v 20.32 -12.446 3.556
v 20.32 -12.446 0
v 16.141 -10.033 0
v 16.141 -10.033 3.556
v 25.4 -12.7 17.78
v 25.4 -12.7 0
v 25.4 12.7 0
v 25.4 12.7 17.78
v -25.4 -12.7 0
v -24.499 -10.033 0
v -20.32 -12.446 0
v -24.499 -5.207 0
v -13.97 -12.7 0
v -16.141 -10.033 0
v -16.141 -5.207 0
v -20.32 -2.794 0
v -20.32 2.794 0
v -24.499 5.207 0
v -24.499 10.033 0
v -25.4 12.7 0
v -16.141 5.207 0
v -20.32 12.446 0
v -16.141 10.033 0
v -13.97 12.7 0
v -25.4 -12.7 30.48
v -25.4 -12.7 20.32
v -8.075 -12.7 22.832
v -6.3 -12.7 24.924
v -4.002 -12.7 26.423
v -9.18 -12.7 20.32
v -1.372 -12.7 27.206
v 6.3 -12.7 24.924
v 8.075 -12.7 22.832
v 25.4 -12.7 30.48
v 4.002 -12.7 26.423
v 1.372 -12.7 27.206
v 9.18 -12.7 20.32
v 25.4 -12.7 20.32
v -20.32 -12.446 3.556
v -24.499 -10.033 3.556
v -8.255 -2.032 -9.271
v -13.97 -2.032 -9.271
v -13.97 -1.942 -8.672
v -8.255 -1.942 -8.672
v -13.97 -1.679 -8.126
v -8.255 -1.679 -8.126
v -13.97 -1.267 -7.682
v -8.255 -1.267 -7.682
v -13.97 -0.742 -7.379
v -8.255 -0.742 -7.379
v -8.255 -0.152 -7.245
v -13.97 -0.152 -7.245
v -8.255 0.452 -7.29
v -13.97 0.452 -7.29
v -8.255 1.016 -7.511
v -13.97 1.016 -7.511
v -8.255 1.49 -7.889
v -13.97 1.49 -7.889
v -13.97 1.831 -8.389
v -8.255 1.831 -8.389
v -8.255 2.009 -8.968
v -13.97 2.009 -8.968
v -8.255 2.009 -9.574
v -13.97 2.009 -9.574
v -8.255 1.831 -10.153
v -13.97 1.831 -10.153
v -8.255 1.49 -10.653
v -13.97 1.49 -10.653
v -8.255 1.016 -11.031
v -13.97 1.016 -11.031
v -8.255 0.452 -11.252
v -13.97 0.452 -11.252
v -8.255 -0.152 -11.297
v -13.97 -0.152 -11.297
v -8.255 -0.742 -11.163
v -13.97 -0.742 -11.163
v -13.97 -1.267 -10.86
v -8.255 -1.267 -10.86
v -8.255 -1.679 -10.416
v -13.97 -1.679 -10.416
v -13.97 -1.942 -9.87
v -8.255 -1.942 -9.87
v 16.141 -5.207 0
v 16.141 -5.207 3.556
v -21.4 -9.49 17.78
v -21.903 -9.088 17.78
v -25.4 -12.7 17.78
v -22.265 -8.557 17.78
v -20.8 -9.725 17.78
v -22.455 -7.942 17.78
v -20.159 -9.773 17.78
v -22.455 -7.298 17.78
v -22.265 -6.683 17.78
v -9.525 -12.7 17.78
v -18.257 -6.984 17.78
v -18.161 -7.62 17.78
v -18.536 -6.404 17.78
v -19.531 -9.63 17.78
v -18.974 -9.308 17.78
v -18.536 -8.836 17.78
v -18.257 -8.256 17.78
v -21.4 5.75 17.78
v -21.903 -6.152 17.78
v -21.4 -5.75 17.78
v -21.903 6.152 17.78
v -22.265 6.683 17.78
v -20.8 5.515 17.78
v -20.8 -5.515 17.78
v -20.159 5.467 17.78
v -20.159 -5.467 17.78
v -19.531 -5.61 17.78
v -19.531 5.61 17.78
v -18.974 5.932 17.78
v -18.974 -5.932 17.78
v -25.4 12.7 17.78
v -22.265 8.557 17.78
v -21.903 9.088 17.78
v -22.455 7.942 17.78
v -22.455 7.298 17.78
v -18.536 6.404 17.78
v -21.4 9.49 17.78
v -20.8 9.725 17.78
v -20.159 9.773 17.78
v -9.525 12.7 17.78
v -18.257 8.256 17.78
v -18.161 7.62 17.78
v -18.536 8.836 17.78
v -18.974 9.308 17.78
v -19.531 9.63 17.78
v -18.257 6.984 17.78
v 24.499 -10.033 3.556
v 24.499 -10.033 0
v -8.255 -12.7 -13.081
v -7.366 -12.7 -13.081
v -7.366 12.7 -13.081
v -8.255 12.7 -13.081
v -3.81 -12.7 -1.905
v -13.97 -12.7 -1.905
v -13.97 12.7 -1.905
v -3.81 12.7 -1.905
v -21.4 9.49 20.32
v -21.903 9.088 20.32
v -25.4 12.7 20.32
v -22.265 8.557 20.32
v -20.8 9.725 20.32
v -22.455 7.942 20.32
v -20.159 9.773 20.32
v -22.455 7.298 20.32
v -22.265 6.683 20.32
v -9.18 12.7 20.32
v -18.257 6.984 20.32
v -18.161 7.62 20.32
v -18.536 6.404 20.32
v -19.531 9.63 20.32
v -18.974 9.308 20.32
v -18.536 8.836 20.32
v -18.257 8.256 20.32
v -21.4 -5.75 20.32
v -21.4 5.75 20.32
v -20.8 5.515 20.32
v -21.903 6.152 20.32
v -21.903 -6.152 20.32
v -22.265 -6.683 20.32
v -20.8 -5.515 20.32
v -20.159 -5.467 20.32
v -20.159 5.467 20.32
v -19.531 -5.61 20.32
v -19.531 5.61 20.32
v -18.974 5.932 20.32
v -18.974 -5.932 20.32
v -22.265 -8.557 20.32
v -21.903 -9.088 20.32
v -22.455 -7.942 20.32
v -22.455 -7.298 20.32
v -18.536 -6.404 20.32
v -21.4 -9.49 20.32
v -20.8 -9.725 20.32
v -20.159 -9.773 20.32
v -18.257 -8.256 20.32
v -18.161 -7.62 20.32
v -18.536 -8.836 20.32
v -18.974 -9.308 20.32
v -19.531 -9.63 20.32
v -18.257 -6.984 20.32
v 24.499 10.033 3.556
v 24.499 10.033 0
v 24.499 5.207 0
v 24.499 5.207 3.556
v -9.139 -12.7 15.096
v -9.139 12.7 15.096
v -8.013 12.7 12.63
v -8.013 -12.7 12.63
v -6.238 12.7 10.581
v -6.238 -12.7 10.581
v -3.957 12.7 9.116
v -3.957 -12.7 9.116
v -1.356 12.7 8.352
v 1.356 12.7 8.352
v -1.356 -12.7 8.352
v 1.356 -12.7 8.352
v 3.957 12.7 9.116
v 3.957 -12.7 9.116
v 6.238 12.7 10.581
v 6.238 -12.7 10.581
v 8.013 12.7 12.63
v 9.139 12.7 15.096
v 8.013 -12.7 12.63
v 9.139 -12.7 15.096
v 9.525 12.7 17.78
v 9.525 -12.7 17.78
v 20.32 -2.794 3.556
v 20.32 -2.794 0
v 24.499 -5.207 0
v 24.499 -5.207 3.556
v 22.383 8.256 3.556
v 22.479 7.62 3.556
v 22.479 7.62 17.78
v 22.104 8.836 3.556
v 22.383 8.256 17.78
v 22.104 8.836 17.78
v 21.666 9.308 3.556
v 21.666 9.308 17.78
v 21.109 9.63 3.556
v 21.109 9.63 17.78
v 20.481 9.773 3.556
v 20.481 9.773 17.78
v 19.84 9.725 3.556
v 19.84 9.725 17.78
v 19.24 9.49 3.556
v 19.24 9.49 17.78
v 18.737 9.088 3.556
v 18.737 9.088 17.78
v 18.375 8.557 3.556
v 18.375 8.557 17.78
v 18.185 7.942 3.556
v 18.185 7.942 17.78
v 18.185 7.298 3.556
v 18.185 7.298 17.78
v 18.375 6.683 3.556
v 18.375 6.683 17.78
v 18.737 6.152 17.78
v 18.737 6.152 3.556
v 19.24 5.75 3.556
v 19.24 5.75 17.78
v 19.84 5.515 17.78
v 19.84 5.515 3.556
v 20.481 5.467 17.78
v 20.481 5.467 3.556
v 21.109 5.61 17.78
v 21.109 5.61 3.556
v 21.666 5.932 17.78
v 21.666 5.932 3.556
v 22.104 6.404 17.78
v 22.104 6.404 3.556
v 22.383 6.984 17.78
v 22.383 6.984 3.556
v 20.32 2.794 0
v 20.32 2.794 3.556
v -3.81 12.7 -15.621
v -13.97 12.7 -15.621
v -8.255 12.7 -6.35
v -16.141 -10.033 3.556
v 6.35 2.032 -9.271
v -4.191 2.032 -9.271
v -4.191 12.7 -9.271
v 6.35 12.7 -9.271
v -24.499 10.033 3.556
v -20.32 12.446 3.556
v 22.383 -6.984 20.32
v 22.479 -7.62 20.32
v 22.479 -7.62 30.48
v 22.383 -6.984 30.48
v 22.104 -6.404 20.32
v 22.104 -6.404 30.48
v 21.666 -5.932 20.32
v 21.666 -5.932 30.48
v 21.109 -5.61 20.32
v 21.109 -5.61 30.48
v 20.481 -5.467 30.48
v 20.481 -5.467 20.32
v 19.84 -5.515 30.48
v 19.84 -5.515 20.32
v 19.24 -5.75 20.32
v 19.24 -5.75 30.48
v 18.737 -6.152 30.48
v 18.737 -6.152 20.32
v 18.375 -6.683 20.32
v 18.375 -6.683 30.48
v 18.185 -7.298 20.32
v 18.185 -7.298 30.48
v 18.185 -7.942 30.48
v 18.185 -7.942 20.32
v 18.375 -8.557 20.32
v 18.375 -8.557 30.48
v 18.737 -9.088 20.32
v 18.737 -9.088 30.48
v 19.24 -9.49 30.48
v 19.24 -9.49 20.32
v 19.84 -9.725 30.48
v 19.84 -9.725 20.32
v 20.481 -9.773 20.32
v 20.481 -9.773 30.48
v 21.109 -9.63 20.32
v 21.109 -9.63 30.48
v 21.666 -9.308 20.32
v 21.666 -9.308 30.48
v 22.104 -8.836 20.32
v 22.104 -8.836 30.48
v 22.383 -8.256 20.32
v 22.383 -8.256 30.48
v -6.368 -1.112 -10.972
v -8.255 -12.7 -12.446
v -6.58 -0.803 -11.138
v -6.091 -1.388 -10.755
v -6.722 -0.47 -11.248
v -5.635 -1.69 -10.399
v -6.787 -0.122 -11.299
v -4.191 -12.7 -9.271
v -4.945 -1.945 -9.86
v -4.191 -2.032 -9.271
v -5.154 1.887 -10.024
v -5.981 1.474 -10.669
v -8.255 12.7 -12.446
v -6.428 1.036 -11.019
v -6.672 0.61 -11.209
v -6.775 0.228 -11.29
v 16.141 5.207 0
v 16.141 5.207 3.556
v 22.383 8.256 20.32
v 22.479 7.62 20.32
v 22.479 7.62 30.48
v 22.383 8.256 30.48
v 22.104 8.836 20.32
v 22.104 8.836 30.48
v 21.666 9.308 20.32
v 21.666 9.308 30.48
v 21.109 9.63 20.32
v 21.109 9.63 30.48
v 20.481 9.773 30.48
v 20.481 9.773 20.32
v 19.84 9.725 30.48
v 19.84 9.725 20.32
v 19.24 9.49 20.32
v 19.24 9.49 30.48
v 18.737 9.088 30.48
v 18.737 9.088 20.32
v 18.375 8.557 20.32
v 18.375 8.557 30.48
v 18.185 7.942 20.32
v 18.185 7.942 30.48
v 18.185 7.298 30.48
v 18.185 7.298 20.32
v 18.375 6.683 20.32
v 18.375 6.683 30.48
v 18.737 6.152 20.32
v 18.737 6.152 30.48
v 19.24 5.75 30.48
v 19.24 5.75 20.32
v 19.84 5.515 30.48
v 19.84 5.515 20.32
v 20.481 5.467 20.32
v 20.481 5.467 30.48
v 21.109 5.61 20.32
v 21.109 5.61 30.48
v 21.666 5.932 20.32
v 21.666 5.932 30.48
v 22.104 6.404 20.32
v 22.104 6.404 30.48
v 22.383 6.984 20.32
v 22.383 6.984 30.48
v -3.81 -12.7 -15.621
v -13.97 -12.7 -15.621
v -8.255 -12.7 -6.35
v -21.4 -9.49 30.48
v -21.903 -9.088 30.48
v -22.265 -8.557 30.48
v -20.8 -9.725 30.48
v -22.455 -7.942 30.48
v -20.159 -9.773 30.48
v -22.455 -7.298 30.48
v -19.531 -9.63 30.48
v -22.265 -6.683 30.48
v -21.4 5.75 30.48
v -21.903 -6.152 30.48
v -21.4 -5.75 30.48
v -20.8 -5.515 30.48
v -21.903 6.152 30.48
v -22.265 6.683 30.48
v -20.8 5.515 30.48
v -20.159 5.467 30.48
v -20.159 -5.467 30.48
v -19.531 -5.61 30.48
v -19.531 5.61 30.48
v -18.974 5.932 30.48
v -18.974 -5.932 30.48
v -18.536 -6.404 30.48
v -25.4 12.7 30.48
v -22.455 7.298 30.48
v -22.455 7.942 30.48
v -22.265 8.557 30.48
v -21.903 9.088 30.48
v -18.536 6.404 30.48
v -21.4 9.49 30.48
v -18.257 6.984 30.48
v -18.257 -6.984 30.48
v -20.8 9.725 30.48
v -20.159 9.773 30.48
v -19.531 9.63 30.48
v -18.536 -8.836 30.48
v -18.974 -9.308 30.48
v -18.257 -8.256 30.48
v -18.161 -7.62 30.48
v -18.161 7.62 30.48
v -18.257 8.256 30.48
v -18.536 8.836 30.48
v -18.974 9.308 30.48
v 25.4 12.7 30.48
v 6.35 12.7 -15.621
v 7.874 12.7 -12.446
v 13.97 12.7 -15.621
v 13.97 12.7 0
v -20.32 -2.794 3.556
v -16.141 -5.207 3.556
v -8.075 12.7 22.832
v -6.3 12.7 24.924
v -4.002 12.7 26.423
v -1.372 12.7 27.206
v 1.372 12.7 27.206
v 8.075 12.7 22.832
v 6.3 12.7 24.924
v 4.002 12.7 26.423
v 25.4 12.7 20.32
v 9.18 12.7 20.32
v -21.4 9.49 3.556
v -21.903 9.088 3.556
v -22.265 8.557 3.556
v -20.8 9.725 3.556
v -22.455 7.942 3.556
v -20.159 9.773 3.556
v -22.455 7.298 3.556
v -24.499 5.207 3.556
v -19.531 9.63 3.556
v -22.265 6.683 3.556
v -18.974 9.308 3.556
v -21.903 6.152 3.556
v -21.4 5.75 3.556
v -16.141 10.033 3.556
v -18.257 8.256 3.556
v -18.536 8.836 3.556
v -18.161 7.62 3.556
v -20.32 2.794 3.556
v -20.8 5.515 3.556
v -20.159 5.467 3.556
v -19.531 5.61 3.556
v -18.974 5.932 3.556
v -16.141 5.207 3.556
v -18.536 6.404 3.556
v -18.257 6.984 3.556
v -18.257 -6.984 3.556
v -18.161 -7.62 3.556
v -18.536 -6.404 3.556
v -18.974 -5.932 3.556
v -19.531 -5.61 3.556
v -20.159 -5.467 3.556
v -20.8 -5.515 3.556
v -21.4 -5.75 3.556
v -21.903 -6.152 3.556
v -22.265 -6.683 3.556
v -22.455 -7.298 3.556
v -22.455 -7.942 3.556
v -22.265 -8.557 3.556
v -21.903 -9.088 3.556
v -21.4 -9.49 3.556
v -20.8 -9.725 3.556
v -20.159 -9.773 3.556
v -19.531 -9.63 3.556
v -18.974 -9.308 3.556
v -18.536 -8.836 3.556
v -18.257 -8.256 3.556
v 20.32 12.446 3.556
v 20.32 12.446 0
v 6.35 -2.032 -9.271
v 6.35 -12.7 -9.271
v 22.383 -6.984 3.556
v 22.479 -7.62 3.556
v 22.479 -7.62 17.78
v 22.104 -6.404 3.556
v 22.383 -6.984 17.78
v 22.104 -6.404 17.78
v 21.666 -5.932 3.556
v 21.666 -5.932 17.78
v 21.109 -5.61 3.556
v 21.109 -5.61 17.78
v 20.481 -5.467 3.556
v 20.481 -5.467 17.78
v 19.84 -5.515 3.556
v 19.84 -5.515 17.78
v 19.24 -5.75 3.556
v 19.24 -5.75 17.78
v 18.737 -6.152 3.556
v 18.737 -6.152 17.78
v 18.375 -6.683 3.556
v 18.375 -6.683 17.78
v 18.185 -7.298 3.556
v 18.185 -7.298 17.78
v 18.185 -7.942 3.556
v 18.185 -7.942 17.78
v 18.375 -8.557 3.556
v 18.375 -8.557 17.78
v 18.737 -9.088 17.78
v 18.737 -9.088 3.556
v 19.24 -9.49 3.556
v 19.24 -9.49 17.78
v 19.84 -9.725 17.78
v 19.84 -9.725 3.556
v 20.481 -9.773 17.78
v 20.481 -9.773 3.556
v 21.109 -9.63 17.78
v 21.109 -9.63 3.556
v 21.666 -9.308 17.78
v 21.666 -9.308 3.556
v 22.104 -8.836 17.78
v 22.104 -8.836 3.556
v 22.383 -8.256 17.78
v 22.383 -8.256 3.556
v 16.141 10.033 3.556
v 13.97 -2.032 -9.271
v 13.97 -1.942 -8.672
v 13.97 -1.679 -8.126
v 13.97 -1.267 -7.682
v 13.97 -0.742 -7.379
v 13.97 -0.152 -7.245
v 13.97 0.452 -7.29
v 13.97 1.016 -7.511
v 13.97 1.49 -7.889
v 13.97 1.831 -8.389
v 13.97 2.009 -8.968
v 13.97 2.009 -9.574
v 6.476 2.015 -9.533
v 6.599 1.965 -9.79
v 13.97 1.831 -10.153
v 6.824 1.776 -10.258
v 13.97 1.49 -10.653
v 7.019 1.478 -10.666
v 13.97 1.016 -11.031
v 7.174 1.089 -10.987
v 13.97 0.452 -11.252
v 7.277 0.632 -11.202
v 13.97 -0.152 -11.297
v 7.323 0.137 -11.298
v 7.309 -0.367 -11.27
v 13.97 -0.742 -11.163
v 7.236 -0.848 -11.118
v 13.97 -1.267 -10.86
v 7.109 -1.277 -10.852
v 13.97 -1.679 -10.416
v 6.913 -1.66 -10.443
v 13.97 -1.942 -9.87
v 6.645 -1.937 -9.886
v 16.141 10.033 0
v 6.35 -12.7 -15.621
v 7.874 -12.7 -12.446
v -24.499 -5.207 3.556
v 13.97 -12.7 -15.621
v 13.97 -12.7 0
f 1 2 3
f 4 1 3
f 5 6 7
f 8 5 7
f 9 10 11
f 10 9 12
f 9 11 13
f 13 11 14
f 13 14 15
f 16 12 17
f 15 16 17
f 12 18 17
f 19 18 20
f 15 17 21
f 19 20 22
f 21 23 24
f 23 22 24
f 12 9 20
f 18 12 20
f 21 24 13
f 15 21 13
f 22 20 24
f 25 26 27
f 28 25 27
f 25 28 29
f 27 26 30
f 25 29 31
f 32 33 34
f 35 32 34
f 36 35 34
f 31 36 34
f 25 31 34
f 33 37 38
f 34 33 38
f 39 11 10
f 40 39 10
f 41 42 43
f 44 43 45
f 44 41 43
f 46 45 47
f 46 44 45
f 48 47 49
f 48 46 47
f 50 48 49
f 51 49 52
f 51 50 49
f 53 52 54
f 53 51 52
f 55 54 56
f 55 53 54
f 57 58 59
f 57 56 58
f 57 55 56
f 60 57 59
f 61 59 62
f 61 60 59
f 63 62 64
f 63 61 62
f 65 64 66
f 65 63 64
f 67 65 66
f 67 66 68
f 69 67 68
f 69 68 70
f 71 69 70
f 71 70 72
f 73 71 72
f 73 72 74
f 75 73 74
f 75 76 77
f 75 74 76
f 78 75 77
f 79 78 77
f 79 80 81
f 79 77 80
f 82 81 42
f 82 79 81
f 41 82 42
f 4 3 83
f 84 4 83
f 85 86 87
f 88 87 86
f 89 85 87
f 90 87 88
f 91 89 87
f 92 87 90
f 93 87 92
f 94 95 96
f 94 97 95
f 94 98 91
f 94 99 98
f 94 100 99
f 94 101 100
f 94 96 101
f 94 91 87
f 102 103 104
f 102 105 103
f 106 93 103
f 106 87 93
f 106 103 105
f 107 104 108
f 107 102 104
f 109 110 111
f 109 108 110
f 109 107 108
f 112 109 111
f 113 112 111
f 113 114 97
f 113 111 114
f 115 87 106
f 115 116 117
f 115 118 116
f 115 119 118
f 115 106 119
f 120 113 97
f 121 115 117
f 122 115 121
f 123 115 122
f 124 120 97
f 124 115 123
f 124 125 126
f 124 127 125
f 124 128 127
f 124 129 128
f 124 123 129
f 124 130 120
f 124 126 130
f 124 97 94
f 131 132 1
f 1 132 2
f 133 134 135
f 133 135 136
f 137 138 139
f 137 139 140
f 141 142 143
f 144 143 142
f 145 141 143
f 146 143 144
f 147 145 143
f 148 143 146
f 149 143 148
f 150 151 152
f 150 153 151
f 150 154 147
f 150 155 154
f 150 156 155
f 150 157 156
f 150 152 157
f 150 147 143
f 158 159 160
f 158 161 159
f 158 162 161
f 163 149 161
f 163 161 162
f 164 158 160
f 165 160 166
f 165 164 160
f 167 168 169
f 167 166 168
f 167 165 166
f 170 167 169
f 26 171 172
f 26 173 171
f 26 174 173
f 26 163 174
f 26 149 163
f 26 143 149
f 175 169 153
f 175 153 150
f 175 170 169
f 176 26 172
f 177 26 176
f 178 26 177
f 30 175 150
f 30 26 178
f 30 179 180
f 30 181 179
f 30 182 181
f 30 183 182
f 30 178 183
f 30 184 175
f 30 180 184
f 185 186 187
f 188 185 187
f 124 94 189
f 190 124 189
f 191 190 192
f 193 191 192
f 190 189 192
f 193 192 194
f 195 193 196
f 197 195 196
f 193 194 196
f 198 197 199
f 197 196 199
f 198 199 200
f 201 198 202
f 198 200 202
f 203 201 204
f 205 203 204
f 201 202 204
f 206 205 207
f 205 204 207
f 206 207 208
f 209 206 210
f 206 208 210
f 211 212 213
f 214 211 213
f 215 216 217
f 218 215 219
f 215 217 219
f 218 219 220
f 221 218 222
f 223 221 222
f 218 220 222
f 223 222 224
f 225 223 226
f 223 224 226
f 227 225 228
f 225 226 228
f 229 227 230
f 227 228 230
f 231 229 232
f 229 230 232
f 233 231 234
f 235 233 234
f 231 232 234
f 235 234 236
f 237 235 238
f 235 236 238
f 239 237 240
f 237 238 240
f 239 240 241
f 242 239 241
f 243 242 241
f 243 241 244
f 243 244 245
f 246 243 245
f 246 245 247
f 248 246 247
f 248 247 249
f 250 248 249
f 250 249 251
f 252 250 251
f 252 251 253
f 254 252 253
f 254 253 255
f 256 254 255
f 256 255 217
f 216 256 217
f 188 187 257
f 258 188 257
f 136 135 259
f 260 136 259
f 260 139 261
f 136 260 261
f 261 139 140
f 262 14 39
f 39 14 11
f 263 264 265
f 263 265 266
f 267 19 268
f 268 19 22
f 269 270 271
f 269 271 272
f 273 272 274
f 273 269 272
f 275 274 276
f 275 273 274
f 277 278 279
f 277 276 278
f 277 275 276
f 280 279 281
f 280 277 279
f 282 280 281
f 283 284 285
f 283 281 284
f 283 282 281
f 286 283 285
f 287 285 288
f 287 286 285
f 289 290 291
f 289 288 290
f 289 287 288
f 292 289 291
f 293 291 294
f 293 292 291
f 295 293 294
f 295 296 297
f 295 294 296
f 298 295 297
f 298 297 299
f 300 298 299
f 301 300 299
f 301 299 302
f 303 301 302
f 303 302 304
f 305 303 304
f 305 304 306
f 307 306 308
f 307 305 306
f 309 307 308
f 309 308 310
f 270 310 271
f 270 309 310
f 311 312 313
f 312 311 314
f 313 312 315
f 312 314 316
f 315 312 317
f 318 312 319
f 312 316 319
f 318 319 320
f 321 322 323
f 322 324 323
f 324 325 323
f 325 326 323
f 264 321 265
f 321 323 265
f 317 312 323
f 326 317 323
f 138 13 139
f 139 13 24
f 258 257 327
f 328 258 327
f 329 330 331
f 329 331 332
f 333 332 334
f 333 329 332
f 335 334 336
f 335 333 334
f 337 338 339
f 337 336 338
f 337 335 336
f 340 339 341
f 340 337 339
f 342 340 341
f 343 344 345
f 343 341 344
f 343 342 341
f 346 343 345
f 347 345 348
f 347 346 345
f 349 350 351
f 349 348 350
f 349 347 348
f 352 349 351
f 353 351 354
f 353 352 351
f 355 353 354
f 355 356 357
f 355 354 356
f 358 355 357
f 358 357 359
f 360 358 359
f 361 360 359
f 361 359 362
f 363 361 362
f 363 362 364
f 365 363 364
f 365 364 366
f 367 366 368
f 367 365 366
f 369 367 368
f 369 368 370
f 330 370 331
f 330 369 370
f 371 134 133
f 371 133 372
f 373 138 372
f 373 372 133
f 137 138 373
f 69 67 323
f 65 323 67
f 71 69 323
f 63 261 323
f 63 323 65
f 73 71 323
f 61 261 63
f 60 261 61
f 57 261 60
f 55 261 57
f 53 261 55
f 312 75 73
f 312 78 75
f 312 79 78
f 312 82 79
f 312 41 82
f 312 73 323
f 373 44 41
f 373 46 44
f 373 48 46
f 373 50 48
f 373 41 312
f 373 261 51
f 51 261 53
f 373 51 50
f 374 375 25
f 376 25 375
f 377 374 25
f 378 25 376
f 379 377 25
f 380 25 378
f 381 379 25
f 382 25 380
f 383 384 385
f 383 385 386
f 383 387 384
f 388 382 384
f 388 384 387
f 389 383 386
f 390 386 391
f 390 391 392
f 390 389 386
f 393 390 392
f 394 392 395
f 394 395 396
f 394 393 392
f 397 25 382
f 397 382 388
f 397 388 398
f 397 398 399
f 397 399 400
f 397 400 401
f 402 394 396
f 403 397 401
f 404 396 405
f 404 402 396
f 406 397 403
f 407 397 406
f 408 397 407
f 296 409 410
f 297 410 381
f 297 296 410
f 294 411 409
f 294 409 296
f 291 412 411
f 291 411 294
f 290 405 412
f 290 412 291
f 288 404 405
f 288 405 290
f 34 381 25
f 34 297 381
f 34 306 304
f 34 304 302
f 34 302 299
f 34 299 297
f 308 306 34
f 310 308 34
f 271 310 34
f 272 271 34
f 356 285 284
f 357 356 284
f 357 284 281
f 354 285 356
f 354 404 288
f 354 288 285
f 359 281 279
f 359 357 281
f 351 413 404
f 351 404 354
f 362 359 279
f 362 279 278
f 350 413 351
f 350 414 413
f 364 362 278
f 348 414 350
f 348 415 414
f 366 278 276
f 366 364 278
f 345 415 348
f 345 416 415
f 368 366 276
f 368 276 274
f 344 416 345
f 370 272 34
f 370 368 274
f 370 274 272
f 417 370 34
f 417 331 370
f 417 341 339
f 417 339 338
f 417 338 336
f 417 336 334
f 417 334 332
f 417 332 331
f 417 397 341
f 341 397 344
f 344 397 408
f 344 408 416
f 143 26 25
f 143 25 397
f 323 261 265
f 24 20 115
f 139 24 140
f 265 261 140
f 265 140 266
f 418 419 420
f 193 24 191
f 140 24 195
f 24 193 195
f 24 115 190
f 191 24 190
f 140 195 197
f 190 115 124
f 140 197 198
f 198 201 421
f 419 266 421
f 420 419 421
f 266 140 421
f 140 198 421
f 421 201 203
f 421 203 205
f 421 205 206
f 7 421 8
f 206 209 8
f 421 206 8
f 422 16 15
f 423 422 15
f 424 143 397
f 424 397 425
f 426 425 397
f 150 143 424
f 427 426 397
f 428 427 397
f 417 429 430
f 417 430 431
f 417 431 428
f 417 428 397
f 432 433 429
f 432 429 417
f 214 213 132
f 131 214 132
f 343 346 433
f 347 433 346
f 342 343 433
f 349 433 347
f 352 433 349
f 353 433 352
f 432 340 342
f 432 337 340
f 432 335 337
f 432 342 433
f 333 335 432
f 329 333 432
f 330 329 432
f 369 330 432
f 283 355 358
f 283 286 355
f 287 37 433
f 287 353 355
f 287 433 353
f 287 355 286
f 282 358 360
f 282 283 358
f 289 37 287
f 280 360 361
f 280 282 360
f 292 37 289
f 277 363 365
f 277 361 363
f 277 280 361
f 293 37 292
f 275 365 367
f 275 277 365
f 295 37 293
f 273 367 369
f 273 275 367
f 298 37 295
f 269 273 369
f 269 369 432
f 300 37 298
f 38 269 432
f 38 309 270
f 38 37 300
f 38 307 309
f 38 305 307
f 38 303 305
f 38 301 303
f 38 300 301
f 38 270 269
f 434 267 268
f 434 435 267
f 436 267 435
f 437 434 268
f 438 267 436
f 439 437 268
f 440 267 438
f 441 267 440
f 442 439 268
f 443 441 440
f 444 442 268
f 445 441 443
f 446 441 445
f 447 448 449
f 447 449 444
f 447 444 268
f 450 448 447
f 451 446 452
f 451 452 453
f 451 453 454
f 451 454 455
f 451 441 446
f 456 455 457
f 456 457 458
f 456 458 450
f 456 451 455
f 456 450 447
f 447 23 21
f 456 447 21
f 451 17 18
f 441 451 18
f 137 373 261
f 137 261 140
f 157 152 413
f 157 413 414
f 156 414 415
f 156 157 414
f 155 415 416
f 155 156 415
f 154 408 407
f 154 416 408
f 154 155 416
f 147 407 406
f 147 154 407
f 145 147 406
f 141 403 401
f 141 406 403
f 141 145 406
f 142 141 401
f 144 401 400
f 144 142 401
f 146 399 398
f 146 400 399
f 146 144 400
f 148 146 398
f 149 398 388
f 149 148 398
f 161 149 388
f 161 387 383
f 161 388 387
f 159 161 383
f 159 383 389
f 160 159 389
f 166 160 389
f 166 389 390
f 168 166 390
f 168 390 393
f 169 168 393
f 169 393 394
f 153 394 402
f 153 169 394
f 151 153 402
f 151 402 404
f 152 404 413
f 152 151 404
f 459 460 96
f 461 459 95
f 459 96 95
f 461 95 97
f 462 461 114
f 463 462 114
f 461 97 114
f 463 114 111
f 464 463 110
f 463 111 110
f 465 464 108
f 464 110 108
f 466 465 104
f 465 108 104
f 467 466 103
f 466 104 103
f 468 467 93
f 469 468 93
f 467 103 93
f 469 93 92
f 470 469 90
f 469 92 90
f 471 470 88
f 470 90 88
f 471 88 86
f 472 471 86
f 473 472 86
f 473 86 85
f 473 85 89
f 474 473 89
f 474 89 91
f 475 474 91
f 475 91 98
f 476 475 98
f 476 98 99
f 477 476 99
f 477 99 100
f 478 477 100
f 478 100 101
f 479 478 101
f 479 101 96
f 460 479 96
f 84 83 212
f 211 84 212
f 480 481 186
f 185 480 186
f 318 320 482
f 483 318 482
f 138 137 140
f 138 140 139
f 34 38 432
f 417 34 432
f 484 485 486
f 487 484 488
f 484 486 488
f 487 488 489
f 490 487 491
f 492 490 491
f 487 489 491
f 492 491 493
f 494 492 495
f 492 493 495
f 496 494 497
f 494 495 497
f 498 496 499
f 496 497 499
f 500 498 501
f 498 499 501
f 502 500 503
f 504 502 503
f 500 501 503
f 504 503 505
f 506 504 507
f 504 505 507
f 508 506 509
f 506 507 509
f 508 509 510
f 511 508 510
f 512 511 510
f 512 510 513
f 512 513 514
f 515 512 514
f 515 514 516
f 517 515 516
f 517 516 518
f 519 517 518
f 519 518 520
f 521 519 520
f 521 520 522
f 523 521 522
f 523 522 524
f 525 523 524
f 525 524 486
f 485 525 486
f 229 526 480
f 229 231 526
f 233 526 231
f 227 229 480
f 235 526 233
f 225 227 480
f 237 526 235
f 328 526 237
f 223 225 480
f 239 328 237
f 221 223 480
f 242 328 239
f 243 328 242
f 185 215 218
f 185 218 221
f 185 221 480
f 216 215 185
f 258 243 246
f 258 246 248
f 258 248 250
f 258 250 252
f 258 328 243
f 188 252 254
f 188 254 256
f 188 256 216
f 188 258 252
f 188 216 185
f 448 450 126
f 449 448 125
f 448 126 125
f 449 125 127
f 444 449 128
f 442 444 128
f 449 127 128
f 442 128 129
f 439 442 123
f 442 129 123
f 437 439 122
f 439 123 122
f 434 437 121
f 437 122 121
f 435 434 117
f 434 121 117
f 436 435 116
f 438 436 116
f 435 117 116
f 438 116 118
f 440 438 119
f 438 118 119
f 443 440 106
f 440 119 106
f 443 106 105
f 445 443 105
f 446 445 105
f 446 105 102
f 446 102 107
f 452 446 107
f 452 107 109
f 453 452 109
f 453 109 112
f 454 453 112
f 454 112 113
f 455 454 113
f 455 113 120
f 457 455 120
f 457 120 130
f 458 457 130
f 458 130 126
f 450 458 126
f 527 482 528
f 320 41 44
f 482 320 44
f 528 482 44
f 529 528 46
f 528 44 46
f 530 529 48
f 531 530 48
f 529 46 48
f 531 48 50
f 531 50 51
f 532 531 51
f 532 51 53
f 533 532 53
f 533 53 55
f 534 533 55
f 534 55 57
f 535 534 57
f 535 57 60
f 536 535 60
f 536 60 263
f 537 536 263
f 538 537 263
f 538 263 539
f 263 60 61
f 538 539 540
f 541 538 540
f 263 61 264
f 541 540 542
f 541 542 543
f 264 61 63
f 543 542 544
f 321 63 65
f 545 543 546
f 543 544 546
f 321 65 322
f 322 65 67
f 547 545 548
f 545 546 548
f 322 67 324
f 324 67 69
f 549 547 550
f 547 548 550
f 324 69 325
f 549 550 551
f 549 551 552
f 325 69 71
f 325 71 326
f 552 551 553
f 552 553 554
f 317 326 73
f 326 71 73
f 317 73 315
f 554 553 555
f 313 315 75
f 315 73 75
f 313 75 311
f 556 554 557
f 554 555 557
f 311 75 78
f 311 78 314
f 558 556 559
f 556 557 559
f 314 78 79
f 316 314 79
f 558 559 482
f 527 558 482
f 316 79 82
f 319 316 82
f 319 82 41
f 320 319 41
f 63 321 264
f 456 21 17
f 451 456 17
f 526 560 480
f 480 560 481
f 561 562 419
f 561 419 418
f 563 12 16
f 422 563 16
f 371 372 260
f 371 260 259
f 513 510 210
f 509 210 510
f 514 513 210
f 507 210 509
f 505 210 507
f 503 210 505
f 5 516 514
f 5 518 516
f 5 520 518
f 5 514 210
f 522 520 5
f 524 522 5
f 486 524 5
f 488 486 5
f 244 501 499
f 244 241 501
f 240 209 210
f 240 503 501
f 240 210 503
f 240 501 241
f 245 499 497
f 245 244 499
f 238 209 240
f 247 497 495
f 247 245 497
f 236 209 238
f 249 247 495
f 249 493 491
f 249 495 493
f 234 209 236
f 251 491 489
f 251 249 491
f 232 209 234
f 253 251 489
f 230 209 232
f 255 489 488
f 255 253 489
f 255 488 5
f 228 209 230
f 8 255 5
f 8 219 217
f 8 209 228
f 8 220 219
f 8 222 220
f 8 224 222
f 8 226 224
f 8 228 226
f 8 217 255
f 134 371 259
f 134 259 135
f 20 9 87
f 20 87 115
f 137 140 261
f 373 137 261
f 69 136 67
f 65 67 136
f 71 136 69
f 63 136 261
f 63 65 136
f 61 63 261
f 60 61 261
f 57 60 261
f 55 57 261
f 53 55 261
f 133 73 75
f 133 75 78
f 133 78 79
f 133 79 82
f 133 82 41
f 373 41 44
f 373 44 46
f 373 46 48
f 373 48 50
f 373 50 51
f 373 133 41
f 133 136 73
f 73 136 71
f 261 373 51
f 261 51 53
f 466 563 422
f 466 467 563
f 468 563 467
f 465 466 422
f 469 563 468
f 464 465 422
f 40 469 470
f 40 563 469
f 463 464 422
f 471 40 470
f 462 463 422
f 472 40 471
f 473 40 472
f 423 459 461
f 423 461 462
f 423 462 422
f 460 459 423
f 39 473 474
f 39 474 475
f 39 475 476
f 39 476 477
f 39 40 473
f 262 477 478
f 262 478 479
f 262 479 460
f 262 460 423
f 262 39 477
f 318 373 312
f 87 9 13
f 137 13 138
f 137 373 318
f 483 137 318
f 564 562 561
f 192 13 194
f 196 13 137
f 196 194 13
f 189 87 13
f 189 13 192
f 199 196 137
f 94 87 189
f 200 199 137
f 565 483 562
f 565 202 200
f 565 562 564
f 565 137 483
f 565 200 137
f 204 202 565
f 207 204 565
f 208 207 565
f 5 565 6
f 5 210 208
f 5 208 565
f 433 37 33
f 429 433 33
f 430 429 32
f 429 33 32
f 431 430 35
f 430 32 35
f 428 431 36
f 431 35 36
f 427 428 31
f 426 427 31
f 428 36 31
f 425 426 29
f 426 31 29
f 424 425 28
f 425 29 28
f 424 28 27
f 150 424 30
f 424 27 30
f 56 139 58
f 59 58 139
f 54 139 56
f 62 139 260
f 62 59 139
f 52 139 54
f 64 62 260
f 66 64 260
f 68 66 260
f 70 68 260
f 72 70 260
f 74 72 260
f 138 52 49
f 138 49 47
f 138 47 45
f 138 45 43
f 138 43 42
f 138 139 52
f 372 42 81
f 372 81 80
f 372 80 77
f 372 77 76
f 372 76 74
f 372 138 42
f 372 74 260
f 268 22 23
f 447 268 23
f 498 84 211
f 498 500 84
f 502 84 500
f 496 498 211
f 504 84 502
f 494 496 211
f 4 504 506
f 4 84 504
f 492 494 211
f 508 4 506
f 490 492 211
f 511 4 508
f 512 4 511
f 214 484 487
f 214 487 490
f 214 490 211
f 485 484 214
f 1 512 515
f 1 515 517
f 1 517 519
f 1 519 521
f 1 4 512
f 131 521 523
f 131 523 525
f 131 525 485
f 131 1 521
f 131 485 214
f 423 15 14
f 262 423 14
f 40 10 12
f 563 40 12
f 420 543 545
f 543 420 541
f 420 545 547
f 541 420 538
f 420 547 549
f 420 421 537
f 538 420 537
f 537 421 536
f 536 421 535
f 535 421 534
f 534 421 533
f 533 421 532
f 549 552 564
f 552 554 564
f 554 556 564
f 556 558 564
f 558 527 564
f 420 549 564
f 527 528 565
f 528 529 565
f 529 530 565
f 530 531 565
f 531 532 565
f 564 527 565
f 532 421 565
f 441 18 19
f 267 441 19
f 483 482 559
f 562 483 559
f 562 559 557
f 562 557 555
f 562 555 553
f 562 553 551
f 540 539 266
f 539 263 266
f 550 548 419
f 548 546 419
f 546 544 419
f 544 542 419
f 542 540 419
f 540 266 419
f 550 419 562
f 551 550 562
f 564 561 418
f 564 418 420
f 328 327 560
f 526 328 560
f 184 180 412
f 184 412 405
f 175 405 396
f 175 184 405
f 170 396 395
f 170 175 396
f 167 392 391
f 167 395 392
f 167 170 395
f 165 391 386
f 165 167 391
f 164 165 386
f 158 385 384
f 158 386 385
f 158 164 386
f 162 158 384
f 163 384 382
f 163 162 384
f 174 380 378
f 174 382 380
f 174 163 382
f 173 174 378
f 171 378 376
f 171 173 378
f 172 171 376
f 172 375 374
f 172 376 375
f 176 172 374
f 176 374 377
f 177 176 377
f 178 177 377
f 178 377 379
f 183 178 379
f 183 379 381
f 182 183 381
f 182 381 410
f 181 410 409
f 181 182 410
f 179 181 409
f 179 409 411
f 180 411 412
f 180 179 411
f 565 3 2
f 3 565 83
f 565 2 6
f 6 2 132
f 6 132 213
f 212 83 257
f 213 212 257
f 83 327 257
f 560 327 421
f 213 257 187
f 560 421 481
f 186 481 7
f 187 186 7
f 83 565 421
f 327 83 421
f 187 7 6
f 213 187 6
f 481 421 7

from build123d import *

# Parameters (mm, degrees)
F0_W           = 50.8
F0_H           = 25.4
F1_DEPTH       = 17.78
F3_W           = 50.8
F3_H           = 25.4
F4_DEPTH       = 12.7
F2_R           = 9.525
F5_DEPTH       = 76.2
F6_R           = 9.525
F7_DEPTH       = 76.2
F8_W           = 76.2
F8_H           = 58.4089004228
F9_DEPTH       = 2.54
F10_R          = 2.159
F11_DEPTH      = 17.781
F11_DEPTH_BACK = 25.4
F12_R          = 2.159
F13_DEPTH      = 25.4
F13_DEPTH_BACK = 25.4
F15_DEPTH      = 3.556
F16_W          = 27.94
F16_H          = 12.7
F17_DEPTH      = 1.905
F18_W          = 22.225
F18_H          = 25.4
F19_DEPTH      = 7.366
F22_DEPTH      = 50.8
F23_W          = 22.225
F23_H          = 25.4
F24_DEPTH      = 6.35
F26_DEPTH      = 50.8
F28_DEPTH      = 25.4
F20_R          = 2.032
F29_DEPTH      = 50.8
F29_DEPTH_BACK = 25.4


with BuildPart() as f1:
    # F0 (on Top) → F1 (new body)
    with BuildSketch(Plane.XY):
        Rectangle(F0_W, F0_H)
    extrude(amount=F1_DEPTH)


with BuildPart() as f4:
    # F3 (on face) → F4 (new body)
    with BuildSketch(Plane.XY.offset(17.78)):
        Rectangle(F3_W, F3_H)
    extrude(amount=F4_DEPTH)


with BuildPart() as f5_tool:
    # F2 (on face) → F5 (new body)
    with BuildSketch(Plane.XZ.offset(12.7)):
        with Locations((0, 17.78)):
            Circle(F2_R)
    extrude(amount=-F5_DEPTH)


with BuildPart() as f1_1:
    add(f1.part)

    # F5: cut by f5_tool
    add(f5_tool.part, mode=Mode.SUBTRACT)

    # F6 (on face) → F7 (cut)
    with BuildSketch(Plane.XZ.offset(12.7)):
        with Locations((0, 17.78)):
            Circle(F6_R)
    extrude(amount=-F7_DEPTH, mode=Mode.SUBTRACT)


with BuildPart() as f4_1:
    add(f4.part)

    # F5: cut by f5_tool
    add(f5_tool.part, mode=Mode.SUBTRACT)

    # F8 (on face) → F9 (cut)
    with BuildSketch(Plane(origin=(0, 0, 17.78), x_dir=(1, 0, 0), z_dir=(0, 0, -1))):
        with Locations((12.7, -16.5044502114)):
            Rectangle(F8_W, F8_H)
    extrude(amount=-F9_DEPTH, mode=Mode.SUBTRACT)


with BuildPart() as f11_tool:
    # F10 (on face) → F11 (new body, two sides)
    with BuildSketch(Plane.XY.offset(17.78)) as f11_sk:
        with Locations((-20.32, -7.62)):
            Circle(F10_R)
        with Locations((-20.32, 7.62)):
            Circle(F10_R)
    extrude(amount=-F11_DEPTH)
    extrude(f11_sk.sketch, amount=F11_DEPTH_BACK)


with BuildPart() as f1_2:
    add(f1_1.part)

    # F11: cut by f11_tool
    add(f11_tool.part, mode=Mode.SUBTRACT)


with BuildPart() as f4_2:
    add(f4_1.part)

    # F11: cut by f11_tool
    add(f11_tool.part, mode=Mode.SUBTRACT)


with BuildPart() as f13_tool:
    # F12 (on face) → F13 (new body, two sides)
    with BuildSketch(Plane.XY.offset(17.78)) as f13_sk:
        with Locations((20.32, -7.62)):
            Circle(F12_R)
        with Locations((20.32, 7.62)):
            Circle(F12_R)
    extrude(amount=-F13_DEPTH)
    extrude(f13_sk.sketch, amount=F13_DEPTH_BACK)


with BuildPart() as f1_3:
    add(f1_2.part)

    # F13: cut by f13_tool
    add(f13_tool.part, mode=Mode.SUBTRACT)

    # F14 (on face) → F15 (cut)
    with BuildSketch(Plane(origin=(0, 0, 0), x_dir=(1, 0, 0), z_dir=(0, 0, -1))):
        Polygon((-20.32, 2.794), (-16.1405614013, 5.207), (-16.1405614013, 10.033), (-20.32, 12.446), (-24.4994385987, 10.033), (-24.4994385987, 5.207), align=None)
        Polygon((-16.1405614013, -5.207), (-20.32, -2.794), (-24.4994385987, -5.207), (-24.4994385987, -10.033), (-20.32, -12.446), (-16.1405614013, -10.033), align=None)
        Polygon((16.1405614013, 5.207), (20.32, 2.794), (24.4994385987, 5.207), (24.4994385987, 10.033), (20.32, 12.446), (16.1405614013, 10.033), align=None)
        Polygon((24.4994385987, -10.033), (24.4994385987, -5.207), (20.32, -2.794), (16.1405614013, -5.207), (16.1405614013, -10.033), (20.32, -12.446), align=None)
    extrude(amount=-F15_DEPTH, mode=Mode.SUBTRACT)

    # F16 (on face) → F17 (join)
    with BuildSketch(Plane(origin=(0, 0, 0), x_dir=(1, 0, 0), z_dir=(0, 0, -1))):
        with Locations((0, 6.35)):
            Rectangle(F16_W, F16_H)
        with Locations((0, -6.35)):
            Rectangle(F16_W, F16_H)
    extrude(amount=F17_DEPTH)

    # F18 (on face) → F19 (join)
    with BuildSketch(Plane(origin=(0, 0, -1.905), x_dir=(1, 0, 0), z_dir=(0, 0, -1))):
        with Locations((2.8575, 0)):
            Rectangle(F18_W, F18_H)
    extrude(amount=F19_DEPTH)

    # F21 (on face) → F22 (cut)
    with BuildSketch(Plane(origin=(0, 12.7, 0), x_dir=(-1, 0, 0), z_dir=(0, 1, 0))):
        Polygon((8.255, -6.35), (8.255, -1.905), (3.81, -1.905), align=None)
    extrude(amount=-F22_DEPTH, mode=Mode.SUBTRACT)

    # F23 (on face) → F24 (join)
    with BuildSketch(Plane(origin=(0, 0, -9.271), x_dir=(1, 0, 0), z_dir=(0, 0, -1))):
        with Locations((2.8575, 0)):
            Rectangle(F23_W, F23_H)
    extrude(amount=F24_DEPTH)

    # F25 (on face) → F26 (cut)
    with BuildSketch(Plane(origin=(0, 12.7, 0), x_dir=(-1, 0, 0), z_dir=(0, 1, 0))):
        Polygon((4.191, -9.271), (-6.35, -9.271), (-7.874, -12.446), (-6.35, -15.621), (8.255, -15.621), (8.255, -12.446), align=None)
    extrude(amount=-F26_DEPTH, mode=Mode.SUBTRACT)


with BuildPart() as f4_3:
    add(f4_2.part)

    # F13: cut by f13_tool
    add(f13_tool.part, mode=Mode.SUBTRACT)


with BuildPart() as f28:
    # F27 (on face) → F28 (new body)
    with BuildSketch(Plane.XZ.offset(12.7)):
        Polygon((-3.81, -1.905), (-13.97, -1.905), (-13.97, -13.081), (-8.255, -13.081), (-8.255, -12.446), (-8.255, -6.35), align=None)
        Polygon((-8.255, -13.081), (-13.97, -13.081), (-13.97, -15.621), (-3.81, -15.621), (-7.366, -13.081), align=None)
    extrude(amount=-F28_DEPTH)


with BuildPart() as f29_tool:
    # F20 (on face) → F29 (new body, two sides)
    with BuildSketch(Plane(origin=(-8.255, 0, 0), x_dir=(0, -1, 0), z_dir=(-1, 0, 0))) as f29_sk:
        with Locations((0, -9.271)):
            Circle(F20_R)
    extrude(amount=-F29_DEPTH)
    extrude(f29_sk.sketch, amount=F29_DEPTH_BACK)


with BuildPart() as f1_4:
    add(f1_3.part)

    # F29: cut by f29_tool
    add(f29_tool.part, mode=Mode.SUBTRACT)


with BuildPart() as f28_1:
    add(f28.part)

    # F29: cut by f29_tool
    add(f29_tool.part, mode=Mode.SUBTRACT)


solid = Compound([f4_3.part, f1_4.part, f28_1.part])
